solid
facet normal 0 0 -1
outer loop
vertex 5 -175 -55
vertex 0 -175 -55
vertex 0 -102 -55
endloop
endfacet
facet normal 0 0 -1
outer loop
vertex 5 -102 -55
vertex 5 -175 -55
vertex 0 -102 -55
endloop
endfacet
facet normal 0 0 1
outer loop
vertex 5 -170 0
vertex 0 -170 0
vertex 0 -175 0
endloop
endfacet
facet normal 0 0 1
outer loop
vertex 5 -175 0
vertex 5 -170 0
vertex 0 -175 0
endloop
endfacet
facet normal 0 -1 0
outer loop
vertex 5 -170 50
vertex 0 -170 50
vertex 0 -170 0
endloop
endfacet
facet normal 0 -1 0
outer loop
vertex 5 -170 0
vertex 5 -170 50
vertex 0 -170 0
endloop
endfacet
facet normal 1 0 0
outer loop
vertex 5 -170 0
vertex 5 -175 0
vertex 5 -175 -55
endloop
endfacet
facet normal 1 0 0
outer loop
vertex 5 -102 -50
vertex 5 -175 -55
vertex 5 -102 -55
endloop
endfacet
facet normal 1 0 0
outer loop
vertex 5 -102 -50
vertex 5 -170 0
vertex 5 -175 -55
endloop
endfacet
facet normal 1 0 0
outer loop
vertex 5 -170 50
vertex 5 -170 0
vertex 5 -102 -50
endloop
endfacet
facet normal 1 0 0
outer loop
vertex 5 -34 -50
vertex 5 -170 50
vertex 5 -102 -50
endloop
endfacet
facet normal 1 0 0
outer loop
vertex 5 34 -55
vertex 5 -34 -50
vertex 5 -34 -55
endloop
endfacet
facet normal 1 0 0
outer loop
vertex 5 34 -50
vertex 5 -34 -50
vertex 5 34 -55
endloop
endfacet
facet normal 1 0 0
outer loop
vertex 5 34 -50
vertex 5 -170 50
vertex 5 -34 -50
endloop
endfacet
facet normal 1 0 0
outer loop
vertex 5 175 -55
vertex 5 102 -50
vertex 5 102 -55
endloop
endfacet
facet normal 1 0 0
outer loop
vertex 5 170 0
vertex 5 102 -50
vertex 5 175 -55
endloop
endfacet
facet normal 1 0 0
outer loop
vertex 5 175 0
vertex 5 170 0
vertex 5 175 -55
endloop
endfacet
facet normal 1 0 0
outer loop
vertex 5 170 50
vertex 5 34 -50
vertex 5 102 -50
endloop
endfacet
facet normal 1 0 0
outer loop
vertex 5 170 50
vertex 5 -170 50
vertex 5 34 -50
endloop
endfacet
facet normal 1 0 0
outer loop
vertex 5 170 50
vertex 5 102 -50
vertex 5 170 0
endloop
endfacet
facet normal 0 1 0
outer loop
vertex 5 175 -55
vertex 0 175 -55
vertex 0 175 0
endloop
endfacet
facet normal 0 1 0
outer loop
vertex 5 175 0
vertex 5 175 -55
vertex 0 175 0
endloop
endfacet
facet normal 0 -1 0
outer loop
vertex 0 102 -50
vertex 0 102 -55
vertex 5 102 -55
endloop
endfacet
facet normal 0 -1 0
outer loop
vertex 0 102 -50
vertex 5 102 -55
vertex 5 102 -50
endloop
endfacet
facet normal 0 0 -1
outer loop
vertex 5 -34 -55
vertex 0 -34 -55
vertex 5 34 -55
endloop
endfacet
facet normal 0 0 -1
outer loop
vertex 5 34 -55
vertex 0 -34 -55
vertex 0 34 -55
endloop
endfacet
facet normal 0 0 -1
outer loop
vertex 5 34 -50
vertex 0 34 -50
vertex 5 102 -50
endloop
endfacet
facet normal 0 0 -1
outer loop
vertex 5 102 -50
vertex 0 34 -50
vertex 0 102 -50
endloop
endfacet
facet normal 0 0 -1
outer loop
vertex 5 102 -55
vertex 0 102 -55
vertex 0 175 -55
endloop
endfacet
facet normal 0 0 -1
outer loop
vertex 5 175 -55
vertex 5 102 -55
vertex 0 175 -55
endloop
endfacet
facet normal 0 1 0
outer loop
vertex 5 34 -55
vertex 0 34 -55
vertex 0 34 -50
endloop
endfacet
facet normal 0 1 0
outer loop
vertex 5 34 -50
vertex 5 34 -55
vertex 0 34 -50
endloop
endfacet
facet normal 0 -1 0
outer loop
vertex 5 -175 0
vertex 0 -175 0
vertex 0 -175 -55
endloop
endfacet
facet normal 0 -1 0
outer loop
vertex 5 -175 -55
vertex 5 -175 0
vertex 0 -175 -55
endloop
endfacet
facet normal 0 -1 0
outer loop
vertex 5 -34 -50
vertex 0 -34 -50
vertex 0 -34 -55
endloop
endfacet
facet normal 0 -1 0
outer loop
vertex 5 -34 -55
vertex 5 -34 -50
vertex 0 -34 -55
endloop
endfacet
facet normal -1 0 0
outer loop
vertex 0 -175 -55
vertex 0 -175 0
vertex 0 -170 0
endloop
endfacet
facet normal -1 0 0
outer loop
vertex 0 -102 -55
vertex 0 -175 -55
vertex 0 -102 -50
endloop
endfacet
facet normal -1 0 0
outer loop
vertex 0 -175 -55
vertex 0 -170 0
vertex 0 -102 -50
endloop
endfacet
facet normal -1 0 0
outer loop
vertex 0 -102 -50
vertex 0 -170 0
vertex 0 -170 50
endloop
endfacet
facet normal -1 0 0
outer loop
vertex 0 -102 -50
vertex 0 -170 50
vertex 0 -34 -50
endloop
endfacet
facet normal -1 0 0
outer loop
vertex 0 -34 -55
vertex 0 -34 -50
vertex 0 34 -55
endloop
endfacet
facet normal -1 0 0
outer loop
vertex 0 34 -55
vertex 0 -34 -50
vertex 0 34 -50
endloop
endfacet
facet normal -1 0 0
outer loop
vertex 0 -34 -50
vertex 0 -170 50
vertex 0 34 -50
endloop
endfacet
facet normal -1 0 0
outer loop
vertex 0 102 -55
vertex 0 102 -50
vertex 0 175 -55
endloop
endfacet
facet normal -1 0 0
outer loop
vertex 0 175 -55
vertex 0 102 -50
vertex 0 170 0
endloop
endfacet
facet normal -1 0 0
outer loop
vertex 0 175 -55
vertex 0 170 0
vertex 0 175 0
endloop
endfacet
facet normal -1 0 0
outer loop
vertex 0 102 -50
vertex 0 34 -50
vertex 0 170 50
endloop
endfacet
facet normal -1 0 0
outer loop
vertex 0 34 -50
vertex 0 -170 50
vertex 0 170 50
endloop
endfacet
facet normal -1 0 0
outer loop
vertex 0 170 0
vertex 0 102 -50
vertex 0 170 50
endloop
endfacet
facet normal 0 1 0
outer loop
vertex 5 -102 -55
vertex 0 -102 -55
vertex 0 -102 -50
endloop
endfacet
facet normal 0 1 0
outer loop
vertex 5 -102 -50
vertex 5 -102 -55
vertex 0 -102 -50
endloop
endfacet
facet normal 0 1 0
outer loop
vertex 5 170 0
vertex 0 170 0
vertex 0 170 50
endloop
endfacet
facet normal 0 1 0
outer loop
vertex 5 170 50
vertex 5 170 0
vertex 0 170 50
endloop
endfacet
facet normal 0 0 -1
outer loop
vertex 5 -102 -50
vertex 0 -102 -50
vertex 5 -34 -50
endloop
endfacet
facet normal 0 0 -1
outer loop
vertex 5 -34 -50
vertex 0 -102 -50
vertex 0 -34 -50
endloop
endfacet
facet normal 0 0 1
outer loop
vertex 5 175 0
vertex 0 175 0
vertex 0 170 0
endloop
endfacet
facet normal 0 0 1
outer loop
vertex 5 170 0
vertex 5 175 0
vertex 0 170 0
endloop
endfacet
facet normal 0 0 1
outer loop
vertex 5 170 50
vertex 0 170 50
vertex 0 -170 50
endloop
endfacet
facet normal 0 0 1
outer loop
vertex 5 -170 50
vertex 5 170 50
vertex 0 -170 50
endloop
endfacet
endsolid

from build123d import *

# Parameters (mm, degrees)
F0_W     = 73
F0_H     = 5
F0_W_2   = 5
F0_H_2   = 100
F1_DEPTH = 5


with BuildPart() as f1:
    # F0 (on Right) → F1 (new body)
    with BuildSketch(Plane.YZ):
        with Locations((138.5, -52.5)):
            Rectangle(F0_W, F0_H)
        Polygon((102, -50), (175, -50), (175, 0), (170, 0), (170, 50), (5, 50), (5, -50), (34, -50), align=None)
        Polygon((34, -55), (34, -50), (5, -50), (0, -50), (0, -55), align=None)
        with Locations((2.5, 0)):
            Rectangle(F0_W_2, F0_H_2)
        Polygon((0, -55), (0, -50), (-5, -50), (-34, -50), (-34, -55), align=None)
        with Locations((-2.5, 0)):
            Rectangle(F0_W_2, F0_H_2)
        Polygon((-34, -50), (-5, -50), (-5, 50), (-170, 50), (-170, 0), (-175, 0), (-175, -50), (-102, -50), align=None)
        with Locations((-138.5, -52.5)):
            Rectangle(F0_W, F0_H)
    extrude(amount=F1_DEPTH)


solid = f1.part
